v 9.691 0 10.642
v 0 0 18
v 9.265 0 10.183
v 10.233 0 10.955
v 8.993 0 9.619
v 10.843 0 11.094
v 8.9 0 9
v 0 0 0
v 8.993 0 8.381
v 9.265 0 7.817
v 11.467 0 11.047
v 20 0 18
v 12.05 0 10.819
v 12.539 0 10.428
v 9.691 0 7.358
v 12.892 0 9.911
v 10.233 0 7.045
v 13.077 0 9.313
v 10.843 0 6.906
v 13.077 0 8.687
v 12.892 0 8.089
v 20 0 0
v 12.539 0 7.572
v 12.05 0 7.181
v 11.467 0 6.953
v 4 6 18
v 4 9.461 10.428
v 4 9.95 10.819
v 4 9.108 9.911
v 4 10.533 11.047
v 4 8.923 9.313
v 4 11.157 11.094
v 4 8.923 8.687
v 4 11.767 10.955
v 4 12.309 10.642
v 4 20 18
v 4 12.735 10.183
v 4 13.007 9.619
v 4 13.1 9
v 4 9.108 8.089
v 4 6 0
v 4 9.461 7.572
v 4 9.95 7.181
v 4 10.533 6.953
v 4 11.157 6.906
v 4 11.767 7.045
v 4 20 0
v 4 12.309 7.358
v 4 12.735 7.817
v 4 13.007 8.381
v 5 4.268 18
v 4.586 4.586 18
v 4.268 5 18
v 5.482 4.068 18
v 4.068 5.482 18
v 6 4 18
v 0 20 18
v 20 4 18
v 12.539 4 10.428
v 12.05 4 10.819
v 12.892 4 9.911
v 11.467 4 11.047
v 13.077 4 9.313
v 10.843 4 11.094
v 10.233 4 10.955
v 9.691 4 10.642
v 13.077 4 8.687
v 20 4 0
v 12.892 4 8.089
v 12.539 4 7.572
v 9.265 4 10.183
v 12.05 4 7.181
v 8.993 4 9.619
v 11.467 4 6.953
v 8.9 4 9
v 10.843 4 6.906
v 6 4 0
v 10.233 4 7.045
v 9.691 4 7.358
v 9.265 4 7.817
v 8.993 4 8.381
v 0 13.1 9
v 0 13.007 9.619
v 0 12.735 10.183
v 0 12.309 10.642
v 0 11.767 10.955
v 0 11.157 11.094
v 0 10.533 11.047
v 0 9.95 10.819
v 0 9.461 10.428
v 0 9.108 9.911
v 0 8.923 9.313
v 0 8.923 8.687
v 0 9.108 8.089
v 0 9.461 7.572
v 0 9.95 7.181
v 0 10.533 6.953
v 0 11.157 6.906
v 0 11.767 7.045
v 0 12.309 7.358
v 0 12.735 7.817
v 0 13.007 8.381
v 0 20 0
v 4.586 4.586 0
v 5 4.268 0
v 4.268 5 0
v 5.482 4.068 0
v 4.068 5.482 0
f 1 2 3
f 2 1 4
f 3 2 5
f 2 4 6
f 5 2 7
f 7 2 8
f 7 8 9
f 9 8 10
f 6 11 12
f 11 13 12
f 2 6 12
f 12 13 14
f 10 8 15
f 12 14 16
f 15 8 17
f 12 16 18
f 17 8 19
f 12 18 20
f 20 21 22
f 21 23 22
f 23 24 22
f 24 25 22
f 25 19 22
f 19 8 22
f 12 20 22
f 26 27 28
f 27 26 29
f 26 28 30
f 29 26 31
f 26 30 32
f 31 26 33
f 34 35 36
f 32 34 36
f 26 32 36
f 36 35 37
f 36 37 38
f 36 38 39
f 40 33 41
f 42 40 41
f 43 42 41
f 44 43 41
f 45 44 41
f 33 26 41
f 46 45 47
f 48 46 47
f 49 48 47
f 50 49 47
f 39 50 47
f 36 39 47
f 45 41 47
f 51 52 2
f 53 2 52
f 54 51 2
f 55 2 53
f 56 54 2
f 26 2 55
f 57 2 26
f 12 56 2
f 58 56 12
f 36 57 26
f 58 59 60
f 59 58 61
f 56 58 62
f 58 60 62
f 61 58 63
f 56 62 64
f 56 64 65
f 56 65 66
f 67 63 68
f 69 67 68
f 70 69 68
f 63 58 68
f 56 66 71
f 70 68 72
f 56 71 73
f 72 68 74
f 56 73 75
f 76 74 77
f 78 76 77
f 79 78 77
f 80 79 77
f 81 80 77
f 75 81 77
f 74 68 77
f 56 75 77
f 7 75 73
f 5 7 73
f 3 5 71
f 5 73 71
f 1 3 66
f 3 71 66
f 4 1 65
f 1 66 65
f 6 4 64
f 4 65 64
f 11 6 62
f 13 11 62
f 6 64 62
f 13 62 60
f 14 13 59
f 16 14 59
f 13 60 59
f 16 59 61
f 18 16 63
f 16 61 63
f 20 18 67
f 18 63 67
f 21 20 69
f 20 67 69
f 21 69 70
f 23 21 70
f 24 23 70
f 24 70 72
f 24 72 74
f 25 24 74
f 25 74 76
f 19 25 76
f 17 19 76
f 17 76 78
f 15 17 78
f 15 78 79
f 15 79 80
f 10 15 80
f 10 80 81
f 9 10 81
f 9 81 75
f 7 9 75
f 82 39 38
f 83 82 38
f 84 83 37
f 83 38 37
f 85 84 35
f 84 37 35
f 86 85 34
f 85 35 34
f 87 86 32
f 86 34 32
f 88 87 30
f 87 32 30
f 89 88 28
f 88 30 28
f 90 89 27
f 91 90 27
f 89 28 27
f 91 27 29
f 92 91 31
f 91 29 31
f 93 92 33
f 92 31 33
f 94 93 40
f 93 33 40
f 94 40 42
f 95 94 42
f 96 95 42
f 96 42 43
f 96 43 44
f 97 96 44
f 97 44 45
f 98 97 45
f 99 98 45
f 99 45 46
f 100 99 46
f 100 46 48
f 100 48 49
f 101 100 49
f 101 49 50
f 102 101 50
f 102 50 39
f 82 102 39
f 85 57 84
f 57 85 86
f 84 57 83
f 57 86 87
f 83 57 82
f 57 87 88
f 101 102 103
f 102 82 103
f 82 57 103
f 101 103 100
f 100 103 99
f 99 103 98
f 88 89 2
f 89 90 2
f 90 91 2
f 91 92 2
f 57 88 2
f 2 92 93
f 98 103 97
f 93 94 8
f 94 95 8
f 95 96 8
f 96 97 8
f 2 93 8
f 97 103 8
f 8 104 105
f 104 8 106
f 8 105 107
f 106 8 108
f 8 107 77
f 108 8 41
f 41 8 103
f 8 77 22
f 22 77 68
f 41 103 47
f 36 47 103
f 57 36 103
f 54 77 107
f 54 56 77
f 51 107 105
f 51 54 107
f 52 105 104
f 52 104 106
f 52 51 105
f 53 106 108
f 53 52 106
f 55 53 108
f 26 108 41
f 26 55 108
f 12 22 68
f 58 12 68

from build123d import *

# Parameters (mm, degrees)
DODANIE_WYCI_GNI_CIE1_DEPTH = 18
SZKIC2_R                    = 2.1
WYTNIJ_WYCI_GNI_CIE1_DEPTH  = 32.304951685
SZKIC3_R                    = 2.1
WYTNIJ_WYCI_GNI_CIE2_DEPTH  = 32.304951685
ZAOKR_GLENIE1_R             = 2


with BuildPart() as part:
    # Szkic1 → Dodanie-wyciągnięcie1 (new body)
    with BuildSketch(Plane.XY):
        Polygon((0, 0), (20, 0), (20, 4), (4, 4), (4, 20), (0, 20), align=None)
    extrude(amount=DODANIE_WYCI_GNI_CIE1_DEPTH)

    # Szkic2 → Wytnij-wyciągnięcie1 (cut, through all)
    with BuildSketch(Plane(origin=(4, 0, 0), x_dir=(0, 0, -1), z_dir=(1, 0, 0))):
        with Locations(Location((-9, 11, 0), (0, 0, 90))):
            Circle(SZKIC2_R)
    extrude(amount=-WYTNIJ_WYCI_GNI_CIE1_DEPTH, mode=Mode.SUBTRACT)

    # Szkic3 → Wytnij-wyciągnięcie2 (cut, through all)
    with BuildSketch(Plane(origin=(0, 4, 0), x_dir=(1, 0, 0), z_dir=(0, 1, 0))):
        with Locations(Location((11, -9, 0), (0, 0, 180))):
            Circle(SZKIC3_R)
    extrude(amount=-WYTNIJ_WYCI_GNI_CIE2_DEPTH, mode=Mode.SUBTRACT)

    # Zaokrąglenie1
    zaokr_glenie1_edges = [part.edges().sort_by_distance(p)[0] for p in [
        (4, 4, 9),
    ]]
    fillet(zaokr_glenie1_edges, radius=ZAOKR_GLENIE1_R)


solid = part.part
